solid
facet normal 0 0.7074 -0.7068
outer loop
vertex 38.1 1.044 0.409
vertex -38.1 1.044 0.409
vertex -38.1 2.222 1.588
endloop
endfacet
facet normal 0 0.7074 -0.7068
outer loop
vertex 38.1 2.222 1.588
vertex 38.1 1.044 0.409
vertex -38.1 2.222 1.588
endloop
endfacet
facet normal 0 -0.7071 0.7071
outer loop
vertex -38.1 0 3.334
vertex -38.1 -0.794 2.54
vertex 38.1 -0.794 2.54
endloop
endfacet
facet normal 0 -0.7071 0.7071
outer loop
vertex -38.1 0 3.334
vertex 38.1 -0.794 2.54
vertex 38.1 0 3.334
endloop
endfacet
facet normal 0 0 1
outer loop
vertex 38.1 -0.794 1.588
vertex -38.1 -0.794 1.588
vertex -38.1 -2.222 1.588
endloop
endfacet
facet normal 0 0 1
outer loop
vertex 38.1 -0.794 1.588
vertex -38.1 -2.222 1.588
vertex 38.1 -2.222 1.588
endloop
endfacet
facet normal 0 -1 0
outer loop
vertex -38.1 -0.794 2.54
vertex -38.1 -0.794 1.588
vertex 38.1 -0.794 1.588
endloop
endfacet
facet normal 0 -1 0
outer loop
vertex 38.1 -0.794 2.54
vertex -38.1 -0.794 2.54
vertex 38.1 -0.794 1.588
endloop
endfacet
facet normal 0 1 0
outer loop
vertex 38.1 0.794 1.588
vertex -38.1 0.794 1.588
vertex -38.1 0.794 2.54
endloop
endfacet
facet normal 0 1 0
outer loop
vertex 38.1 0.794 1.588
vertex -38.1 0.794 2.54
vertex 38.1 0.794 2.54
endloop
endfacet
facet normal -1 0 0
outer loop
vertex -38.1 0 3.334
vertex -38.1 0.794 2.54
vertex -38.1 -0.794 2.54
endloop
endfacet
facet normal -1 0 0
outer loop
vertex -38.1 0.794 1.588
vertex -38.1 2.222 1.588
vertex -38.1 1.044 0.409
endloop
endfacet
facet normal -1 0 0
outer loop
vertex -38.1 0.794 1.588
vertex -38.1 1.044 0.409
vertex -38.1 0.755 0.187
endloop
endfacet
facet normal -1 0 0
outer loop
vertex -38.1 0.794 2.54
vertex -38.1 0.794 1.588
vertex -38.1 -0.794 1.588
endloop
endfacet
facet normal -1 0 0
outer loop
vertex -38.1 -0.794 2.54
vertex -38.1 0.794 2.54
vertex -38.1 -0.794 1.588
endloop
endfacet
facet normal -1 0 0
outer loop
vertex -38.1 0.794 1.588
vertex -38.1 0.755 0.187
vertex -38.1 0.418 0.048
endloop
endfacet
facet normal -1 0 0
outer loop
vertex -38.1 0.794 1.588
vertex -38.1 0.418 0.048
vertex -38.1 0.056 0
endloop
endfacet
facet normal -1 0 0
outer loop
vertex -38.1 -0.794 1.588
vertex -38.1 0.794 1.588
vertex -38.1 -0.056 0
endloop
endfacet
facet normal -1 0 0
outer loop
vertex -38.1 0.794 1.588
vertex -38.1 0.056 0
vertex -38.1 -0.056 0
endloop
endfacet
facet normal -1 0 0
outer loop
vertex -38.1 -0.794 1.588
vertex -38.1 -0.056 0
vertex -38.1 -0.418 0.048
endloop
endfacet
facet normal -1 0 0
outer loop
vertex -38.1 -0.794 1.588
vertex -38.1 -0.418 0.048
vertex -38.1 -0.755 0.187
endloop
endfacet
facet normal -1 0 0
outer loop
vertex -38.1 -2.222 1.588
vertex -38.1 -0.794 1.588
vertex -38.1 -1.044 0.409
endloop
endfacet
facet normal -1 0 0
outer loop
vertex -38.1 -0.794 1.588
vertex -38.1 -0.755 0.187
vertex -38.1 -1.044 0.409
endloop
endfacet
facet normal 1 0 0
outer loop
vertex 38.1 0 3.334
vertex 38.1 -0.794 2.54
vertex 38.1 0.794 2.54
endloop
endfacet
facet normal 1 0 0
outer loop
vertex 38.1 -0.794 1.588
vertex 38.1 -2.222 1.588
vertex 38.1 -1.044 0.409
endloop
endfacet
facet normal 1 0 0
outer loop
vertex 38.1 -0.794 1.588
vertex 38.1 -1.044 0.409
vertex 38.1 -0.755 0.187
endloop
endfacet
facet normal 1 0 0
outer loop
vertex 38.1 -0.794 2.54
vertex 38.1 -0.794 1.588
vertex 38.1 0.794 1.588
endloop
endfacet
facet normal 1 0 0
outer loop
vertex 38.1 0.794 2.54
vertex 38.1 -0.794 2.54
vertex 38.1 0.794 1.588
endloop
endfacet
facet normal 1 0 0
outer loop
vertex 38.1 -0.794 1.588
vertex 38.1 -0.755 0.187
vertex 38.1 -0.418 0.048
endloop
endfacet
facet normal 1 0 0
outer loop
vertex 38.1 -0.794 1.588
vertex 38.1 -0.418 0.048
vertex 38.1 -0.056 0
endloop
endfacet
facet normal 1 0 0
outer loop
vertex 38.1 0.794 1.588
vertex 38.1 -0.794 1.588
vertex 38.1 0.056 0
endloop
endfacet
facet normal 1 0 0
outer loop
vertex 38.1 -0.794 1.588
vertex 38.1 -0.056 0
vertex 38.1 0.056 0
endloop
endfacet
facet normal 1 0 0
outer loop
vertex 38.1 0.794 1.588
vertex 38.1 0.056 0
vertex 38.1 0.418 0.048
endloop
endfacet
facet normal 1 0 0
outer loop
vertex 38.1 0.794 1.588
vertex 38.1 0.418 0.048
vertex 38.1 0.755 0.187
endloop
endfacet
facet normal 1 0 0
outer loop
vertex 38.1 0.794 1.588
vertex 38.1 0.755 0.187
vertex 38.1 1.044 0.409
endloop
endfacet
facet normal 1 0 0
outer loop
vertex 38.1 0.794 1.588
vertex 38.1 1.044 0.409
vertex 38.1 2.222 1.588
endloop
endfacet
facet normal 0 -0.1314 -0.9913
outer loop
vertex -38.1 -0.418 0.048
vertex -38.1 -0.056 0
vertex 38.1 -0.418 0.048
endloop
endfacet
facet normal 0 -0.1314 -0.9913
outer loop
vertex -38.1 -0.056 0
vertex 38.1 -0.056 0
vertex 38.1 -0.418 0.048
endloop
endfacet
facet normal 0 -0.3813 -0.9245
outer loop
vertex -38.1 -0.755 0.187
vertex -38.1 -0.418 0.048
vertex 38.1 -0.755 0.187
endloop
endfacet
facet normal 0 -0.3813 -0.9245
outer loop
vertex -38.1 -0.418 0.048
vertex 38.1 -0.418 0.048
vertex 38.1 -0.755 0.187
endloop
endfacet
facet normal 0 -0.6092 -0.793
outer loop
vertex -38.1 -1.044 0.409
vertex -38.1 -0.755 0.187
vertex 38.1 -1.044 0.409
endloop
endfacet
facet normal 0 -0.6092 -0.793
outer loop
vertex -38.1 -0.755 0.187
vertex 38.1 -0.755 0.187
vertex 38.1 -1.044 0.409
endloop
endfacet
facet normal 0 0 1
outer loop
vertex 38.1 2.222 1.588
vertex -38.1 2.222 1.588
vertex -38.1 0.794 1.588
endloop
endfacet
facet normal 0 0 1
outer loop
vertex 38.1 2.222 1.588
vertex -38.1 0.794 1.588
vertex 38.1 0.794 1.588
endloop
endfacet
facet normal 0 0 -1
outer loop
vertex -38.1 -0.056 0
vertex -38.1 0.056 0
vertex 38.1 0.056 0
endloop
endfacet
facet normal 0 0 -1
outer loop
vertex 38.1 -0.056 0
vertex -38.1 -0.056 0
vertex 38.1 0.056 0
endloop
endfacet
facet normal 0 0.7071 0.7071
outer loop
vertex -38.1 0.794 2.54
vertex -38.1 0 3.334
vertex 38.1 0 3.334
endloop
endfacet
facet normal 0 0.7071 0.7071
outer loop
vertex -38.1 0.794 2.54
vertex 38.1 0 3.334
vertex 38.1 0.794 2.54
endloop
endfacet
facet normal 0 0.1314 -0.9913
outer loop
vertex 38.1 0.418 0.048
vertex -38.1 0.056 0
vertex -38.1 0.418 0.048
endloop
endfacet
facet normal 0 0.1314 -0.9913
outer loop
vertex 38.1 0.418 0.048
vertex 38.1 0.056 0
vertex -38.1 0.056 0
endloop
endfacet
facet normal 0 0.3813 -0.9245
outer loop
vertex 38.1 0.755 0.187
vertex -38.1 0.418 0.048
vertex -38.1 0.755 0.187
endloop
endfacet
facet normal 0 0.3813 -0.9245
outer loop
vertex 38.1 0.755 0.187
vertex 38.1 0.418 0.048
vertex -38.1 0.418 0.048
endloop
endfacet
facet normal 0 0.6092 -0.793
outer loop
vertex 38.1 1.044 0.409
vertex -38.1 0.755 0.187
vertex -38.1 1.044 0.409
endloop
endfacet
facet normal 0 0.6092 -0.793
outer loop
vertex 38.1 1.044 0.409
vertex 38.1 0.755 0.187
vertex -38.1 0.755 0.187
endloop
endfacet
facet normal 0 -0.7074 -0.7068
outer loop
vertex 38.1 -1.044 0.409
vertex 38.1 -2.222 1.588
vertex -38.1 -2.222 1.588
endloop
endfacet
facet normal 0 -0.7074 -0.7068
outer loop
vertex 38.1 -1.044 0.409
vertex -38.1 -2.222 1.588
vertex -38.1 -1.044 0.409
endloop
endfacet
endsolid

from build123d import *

# Parameters (mm, degrees)
F0_W        = 76.2
F0_H        = 1.5875
F0_H_2      = 2.38125
F1_DEPTH    = 1.5875
F2_DEPTH    = 3.81
F3_T1_DEPTH = 82.7320747894
F4_T1_DEPTH = 89.2641495789
F5_R        = 1.397


# Not quite as in the source:
# - a fillet or chamfer that OpenCascade refuses, or shapes differently, is made with other operations: its cross-section is extruded or revolved along the edge and cut away or added


with BuildPart() as f1:
    # F0 (on Top) → F1 (new body)
    with BuildSketch(Plane.XY):
        Rectangle(F0_W, F0_H)
        with Locations((0, -1.984375)):
            Rectangle(F0_W, F0_H_2)
        with Locations((0, 1.984375)):
            Rectangle(F0_W, F0_H_2)
    extrude(amount=F1_DEPTH)

    # F0 (on Top) → F2 (join)
    with BuildSketch(Plane.XY):
        Rectangle(F0_W, F0_H)
    extrude(amount=F2_DEPTH)

    # F3: chamfer of 1.27 on 2 edges, made by hand

    # F3_s2 → F3_t1 (cut)
    with BuildSketch(Plane.YZ.offset(-41.3660373947)):
        Polygon((-0.79375, 2.54), (0.47625, 3.81), (-0.79375, 3.81), align=None)
        Polygon((-0.47625, 3.81), (0.79375, 2.54), (0.79375, 3.81), align=None)
    extrude(amount=F3_T1_DEPTH, mode=Mode.SUBTRACT)

    # F4: chamfer of 2.54 on 2 edges, made by hand

    # F4_s2 → F4_t1 (cut)
    with BuildSketch(Plane.YZ.offset(-44.6320747894)):
        Polygon((-3.175, 2.54), (-0.635, 0), (-3.175, 0), align=None)
        Polygon((0.635, 0), (3.175, 2.54), (3.175, 0), align=None)
    extrude(amount=F4_T1_DEPTH, mode=Mode.SUBTRACT)

    # F5
    f5_edges = [f1.edges().sort_by_distance(p)[0] for p in [
        (0, -0.635, 0),
        (0, 0.635, 0),
    ]]
    fillet(f5_edges, radius=F5_R)


solid = f1.part
